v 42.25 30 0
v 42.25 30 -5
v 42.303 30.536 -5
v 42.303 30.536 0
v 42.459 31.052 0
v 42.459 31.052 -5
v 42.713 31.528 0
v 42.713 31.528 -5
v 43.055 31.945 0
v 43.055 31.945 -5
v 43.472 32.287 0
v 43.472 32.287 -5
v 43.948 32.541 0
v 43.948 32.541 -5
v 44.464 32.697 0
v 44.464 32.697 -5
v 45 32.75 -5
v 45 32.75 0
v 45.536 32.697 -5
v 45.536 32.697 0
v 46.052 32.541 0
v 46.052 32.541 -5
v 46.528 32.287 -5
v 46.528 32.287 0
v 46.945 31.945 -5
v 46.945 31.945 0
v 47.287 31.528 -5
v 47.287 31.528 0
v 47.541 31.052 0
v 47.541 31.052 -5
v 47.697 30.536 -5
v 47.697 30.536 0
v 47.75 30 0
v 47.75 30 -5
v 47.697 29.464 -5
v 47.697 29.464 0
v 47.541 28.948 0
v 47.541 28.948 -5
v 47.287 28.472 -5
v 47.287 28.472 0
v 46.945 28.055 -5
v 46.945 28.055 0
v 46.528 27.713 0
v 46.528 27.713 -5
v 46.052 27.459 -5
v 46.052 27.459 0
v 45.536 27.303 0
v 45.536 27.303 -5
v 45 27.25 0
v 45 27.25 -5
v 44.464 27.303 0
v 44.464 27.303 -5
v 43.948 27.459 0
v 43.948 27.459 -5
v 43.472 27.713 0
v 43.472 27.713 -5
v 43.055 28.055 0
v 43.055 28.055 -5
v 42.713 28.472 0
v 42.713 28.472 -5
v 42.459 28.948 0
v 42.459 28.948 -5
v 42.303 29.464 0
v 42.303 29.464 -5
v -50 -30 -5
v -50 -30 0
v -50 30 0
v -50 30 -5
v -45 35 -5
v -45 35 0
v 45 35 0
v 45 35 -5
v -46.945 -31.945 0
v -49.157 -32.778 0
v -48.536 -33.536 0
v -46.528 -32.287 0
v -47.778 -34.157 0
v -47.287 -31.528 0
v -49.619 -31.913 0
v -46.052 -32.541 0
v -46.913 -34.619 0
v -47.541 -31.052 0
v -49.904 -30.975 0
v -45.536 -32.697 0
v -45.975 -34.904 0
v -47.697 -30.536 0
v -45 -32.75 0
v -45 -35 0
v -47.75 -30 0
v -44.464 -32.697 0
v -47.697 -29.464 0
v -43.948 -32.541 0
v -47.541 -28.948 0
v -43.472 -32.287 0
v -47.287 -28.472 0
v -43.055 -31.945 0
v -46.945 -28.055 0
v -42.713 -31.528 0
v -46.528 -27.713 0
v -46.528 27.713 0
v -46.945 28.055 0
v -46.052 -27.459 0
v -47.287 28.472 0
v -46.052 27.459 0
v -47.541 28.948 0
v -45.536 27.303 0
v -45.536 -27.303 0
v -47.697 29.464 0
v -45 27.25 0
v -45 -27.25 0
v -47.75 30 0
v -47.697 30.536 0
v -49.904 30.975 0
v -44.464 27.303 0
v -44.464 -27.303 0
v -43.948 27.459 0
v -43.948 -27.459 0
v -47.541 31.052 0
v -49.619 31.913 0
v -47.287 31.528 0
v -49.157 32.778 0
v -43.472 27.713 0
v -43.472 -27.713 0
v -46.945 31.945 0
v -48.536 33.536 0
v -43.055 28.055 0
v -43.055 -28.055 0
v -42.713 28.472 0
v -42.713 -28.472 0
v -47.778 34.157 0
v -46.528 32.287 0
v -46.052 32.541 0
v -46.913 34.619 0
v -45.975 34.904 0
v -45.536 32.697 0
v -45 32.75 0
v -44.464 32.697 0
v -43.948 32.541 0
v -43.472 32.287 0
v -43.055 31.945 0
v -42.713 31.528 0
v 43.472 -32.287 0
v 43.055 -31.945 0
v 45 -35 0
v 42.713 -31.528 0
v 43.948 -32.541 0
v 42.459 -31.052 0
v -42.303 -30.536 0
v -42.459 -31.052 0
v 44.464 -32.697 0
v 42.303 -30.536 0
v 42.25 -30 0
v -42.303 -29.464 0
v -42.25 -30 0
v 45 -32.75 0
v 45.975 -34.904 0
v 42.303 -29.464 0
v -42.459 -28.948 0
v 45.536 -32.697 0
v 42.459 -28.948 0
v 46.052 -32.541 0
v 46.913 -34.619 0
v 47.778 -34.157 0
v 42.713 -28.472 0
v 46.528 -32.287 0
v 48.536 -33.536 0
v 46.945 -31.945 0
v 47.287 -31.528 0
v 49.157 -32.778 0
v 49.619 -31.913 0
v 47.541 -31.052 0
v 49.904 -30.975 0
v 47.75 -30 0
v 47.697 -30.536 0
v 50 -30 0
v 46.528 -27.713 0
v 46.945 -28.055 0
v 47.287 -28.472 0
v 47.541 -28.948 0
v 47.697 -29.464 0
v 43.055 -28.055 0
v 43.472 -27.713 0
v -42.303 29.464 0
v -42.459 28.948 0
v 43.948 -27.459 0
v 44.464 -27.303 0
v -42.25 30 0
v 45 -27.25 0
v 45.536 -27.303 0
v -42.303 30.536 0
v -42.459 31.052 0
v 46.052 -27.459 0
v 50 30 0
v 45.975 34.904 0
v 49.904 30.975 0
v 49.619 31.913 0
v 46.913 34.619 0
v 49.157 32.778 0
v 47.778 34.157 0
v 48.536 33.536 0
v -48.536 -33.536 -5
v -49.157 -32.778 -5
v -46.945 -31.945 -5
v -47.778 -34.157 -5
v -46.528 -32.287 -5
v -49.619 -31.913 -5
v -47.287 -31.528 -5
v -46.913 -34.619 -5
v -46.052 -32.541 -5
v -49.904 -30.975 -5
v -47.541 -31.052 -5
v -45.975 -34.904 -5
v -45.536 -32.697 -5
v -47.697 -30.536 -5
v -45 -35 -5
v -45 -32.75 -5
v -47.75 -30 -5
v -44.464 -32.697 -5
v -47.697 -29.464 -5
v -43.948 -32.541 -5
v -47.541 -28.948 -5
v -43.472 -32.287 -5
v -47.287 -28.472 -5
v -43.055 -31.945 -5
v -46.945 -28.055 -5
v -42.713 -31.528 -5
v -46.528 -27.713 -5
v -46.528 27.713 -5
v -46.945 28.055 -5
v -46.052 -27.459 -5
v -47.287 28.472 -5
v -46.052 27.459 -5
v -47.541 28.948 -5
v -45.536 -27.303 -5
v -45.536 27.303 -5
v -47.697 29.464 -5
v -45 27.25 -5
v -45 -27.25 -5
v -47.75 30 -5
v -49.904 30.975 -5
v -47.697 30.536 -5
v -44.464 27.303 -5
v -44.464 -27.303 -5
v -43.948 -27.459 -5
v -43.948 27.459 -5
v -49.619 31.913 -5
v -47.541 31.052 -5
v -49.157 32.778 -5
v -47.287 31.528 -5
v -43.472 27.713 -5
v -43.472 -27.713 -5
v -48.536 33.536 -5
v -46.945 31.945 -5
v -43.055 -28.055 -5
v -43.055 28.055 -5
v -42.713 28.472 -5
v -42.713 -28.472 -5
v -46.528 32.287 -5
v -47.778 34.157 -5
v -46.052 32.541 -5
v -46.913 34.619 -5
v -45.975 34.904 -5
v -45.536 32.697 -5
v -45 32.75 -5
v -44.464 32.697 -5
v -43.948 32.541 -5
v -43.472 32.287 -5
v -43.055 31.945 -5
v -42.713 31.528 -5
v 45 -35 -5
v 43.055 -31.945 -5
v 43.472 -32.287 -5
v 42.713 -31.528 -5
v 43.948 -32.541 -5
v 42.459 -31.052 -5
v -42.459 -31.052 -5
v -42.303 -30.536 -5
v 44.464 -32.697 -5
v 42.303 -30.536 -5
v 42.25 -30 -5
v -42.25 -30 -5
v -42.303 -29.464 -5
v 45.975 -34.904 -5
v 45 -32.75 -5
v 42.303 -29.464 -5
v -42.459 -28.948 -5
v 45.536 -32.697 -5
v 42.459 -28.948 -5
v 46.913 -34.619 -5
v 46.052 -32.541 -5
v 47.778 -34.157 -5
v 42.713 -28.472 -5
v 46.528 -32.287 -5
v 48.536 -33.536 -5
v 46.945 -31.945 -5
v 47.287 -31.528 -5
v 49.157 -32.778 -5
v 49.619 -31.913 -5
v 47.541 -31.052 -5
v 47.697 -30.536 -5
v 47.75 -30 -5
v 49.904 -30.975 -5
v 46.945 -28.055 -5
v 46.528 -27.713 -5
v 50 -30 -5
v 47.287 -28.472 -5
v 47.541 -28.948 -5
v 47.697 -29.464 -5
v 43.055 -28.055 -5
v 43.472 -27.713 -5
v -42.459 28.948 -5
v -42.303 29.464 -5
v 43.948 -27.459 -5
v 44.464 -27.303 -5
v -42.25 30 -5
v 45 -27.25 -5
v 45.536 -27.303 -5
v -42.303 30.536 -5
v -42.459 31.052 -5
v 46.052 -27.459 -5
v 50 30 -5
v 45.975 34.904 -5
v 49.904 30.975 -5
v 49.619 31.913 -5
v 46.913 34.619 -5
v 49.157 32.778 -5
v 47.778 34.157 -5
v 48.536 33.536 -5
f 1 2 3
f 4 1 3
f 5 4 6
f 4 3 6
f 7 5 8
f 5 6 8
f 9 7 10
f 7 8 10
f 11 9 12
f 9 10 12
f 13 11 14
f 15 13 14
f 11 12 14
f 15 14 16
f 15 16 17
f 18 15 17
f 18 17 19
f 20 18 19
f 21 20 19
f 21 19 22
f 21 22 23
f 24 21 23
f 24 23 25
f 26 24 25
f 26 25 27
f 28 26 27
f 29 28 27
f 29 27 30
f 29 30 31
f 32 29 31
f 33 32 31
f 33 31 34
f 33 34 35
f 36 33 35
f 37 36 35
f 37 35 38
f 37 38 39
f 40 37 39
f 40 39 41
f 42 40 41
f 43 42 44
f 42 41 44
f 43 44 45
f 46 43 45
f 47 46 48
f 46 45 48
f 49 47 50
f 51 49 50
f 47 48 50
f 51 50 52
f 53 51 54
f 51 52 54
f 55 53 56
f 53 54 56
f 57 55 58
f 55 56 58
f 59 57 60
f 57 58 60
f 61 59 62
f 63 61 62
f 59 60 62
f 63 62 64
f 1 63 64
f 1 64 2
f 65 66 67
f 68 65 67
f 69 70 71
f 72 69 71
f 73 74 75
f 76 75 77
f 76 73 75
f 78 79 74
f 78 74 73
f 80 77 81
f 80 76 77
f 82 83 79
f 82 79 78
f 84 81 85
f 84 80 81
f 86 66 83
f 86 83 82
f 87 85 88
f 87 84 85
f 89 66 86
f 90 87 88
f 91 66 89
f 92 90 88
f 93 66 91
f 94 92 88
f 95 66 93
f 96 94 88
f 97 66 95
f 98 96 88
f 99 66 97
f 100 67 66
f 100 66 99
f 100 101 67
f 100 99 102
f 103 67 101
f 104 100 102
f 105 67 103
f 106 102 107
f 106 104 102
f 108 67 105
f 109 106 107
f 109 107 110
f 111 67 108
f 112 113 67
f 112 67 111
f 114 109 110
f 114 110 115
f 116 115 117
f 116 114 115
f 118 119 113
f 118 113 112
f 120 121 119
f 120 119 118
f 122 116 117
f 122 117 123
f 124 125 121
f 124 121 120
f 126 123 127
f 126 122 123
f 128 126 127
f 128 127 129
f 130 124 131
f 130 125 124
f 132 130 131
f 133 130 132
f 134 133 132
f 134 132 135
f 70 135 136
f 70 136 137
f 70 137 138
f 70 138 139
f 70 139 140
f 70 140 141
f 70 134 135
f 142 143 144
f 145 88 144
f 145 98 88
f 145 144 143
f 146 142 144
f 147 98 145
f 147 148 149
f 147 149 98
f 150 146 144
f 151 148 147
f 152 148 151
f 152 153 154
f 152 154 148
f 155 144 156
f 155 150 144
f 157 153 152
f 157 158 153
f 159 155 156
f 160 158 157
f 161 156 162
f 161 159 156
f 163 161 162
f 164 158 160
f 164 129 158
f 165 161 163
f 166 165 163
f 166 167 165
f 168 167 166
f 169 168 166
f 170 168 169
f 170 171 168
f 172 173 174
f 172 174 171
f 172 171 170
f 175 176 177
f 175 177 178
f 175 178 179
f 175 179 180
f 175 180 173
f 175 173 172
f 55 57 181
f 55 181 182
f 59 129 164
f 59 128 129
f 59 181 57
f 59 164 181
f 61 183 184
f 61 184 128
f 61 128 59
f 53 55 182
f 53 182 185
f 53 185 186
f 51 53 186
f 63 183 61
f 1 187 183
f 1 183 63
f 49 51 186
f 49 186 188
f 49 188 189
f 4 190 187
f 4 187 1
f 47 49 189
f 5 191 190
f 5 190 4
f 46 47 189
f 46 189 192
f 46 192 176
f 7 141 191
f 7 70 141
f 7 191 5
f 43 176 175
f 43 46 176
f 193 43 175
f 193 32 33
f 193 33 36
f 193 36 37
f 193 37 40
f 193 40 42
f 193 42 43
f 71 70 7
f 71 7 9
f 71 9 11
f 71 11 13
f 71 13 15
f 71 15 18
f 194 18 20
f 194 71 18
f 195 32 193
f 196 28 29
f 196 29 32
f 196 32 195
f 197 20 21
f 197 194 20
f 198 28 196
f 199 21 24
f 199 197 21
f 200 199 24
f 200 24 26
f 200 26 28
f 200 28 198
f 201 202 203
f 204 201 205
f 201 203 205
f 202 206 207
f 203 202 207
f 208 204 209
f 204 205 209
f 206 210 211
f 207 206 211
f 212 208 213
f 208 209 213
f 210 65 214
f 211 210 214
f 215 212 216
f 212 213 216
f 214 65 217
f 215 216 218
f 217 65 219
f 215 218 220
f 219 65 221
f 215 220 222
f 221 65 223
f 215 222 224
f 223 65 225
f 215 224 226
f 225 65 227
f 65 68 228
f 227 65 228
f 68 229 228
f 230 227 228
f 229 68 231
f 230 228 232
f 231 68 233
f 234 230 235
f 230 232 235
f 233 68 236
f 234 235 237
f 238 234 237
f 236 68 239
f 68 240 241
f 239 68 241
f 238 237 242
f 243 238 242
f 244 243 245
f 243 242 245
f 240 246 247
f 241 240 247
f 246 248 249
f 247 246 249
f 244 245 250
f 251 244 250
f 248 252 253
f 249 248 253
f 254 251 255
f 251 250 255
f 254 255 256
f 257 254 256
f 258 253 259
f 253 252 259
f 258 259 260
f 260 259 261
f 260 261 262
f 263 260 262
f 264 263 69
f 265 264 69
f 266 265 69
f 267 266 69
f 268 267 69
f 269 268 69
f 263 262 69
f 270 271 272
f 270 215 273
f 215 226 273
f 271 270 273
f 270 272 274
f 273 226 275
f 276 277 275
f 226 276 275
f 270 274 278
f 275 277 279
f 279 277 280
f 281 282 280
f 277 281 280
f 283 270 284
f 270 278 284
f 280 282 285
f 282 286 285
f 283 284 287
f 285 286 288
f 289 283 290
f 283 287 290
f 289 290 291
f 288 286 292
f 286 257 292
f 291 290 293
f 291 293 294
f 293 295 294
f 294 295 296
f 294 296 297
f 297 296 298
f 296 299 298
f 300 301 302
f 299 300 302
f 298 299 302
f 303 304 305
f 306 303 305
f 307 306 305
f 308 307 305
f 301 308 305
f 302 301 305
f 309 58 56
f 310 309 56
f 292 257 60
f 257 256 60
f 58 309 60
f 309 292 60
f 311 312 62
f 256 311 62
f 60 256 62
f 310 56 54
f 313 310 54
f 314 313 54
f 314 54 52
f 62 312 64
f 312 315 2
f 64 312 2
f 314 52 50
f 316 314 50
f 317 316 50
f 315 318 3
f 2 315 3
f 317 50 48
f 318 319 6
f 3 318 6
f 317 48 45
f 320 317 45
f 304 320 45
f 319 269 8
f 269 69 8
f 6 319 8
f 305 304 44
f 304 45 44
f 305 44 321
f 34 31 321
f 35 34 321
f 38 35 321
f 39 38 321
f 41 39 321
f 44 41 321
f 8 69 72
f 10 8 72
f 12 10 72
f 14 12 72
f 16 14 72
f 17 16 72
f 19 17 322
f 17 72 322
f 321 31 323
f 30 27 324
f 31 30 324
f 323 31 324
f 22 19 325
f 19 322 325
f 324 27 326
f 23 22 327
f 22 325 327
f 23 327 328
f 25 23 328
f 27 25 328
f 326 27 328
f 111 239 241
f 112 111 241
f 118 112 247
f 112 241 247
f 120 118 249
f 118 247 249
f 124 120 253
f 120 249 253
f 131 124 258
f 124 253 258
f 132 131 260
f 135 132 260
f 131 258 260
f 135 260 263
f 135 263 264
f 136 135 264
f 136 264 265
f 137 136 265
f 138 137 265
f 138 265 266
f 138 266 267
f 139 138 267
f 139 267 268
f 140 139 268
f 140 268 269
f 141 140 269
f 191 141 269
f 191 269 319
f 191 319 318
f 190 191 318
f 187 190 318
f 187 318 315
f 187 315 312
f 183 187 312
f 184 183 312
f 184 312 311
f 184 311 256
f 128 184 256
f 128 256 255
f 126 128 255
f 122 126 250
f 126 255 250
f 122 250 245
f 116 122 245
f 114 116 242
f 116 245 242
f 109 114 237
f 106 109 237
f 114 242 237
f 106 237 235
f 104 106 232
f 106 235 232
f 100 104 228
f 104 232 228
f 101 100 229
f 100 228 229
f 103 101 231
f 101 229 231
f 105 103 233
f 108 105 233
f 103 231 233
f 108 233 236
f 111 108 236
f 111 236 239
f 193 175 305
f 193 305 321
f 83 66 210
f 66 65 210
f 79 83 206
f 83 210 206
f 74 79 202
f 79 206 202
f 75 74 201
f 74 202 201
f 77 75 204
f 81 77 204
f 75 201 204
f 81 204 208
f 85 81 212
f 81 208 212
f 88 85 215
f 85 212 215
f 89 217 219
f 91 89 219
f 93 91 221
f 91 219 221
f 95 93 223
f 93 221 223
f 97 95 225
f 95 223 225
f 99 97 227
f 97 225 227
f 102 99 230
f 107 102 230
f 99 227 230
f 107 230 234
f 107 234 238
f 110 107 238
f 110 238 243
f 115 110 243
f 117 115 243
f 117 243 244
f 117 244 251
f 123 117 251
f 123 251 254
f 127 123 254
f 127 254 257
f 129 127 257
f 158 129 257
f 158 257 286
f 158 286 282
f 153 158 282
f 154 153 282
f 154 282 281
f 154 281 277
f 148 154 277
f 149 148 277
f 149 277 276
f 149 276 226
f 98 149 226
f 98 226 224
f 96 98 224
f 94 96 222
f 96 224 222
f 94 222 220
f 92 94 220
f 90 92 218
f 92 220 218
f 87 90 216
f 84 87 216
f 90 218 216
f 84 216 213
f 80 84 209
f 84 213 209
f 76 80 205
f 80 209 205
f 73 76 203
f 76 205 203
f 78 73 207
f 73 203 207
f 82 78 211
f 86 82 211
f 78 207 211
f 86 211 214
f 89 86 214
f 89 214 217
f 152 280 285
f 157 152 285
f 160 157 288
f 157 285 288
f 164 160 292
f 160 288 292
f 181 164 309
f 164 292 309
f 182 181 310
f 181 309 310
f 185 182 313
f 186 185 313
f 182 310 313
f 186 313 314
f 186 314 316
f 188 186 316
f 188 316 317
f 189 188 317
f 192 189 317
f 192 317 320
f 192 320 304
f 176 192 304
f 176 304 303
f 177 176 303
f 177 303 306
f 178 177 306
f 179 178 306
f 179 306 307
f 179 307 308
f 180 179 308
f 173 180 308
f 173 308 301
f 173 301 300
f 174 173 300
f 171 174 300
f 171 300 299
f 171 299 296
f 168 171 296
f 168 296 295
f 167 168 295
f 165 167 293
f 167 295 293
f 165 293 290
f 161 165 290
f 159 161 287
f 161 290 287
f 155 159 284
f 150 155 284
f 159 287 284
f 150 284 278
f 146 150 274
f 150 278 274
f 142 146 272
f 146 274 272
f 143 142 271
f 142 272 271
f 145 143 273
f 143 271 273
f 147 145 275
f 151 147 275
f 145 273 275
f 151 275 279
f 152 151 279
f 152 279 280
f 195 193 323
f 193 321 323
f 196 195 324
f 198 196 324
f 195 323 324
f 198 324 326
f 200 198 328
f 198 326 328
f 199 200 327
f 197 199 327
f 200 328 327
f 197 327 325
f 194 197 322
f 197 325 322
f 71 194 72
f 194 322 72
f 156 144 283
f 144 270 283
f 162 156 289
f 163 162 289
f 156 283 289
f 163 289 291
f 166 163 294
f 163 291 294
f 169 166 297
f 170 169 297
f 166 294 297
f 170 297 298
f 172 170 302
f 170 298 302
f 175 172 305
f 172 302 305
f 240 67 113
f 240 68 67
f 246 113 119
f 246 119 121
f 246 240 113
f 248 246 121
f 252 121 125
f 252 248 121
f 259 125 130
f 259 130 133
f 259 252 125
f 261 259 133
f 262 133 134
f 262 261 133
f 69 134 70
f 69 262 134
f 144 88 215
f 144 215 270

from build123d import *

# Parameters (mm, degrees)
F0_W     = 100
F0_H     = 70
F0_W_2   = 90
F0_H_2   = 60
F1_DEPTH = 5
F2_R     = 5
F4_D     = 5.5


with BuildPart() as f1:
    # F0 (on Top) → F1 (new body)
    with BuildSketch(Plane.XY):
        Rectangle(F0_W, F0_H)
        Rectangle(F0_W_2, F0_H_2, mode=Mode.SUBTRACT)
        Rectangle(F0_W_2, F0_H_2)
    extrude(amount=-F1_DEPTH)

    # F2
    f2_edges = [f1.edges().sort_by_distance(p)[0] for p in [
        (-50, -35, -2.5),
        (-50, 35, -2.5),
        (50, -35, -2.5),
        (50, 35, -2.5),
    ]]
    fillet(f2_edges, radius=F2_R)

    # F4 (through all)
    with Locations(Plane.XY):
        with Locations((-45, 30), (-45, -30), (45, -30), (45, 30)):
            Hole(F4_D / 2)


solid = f1.part
